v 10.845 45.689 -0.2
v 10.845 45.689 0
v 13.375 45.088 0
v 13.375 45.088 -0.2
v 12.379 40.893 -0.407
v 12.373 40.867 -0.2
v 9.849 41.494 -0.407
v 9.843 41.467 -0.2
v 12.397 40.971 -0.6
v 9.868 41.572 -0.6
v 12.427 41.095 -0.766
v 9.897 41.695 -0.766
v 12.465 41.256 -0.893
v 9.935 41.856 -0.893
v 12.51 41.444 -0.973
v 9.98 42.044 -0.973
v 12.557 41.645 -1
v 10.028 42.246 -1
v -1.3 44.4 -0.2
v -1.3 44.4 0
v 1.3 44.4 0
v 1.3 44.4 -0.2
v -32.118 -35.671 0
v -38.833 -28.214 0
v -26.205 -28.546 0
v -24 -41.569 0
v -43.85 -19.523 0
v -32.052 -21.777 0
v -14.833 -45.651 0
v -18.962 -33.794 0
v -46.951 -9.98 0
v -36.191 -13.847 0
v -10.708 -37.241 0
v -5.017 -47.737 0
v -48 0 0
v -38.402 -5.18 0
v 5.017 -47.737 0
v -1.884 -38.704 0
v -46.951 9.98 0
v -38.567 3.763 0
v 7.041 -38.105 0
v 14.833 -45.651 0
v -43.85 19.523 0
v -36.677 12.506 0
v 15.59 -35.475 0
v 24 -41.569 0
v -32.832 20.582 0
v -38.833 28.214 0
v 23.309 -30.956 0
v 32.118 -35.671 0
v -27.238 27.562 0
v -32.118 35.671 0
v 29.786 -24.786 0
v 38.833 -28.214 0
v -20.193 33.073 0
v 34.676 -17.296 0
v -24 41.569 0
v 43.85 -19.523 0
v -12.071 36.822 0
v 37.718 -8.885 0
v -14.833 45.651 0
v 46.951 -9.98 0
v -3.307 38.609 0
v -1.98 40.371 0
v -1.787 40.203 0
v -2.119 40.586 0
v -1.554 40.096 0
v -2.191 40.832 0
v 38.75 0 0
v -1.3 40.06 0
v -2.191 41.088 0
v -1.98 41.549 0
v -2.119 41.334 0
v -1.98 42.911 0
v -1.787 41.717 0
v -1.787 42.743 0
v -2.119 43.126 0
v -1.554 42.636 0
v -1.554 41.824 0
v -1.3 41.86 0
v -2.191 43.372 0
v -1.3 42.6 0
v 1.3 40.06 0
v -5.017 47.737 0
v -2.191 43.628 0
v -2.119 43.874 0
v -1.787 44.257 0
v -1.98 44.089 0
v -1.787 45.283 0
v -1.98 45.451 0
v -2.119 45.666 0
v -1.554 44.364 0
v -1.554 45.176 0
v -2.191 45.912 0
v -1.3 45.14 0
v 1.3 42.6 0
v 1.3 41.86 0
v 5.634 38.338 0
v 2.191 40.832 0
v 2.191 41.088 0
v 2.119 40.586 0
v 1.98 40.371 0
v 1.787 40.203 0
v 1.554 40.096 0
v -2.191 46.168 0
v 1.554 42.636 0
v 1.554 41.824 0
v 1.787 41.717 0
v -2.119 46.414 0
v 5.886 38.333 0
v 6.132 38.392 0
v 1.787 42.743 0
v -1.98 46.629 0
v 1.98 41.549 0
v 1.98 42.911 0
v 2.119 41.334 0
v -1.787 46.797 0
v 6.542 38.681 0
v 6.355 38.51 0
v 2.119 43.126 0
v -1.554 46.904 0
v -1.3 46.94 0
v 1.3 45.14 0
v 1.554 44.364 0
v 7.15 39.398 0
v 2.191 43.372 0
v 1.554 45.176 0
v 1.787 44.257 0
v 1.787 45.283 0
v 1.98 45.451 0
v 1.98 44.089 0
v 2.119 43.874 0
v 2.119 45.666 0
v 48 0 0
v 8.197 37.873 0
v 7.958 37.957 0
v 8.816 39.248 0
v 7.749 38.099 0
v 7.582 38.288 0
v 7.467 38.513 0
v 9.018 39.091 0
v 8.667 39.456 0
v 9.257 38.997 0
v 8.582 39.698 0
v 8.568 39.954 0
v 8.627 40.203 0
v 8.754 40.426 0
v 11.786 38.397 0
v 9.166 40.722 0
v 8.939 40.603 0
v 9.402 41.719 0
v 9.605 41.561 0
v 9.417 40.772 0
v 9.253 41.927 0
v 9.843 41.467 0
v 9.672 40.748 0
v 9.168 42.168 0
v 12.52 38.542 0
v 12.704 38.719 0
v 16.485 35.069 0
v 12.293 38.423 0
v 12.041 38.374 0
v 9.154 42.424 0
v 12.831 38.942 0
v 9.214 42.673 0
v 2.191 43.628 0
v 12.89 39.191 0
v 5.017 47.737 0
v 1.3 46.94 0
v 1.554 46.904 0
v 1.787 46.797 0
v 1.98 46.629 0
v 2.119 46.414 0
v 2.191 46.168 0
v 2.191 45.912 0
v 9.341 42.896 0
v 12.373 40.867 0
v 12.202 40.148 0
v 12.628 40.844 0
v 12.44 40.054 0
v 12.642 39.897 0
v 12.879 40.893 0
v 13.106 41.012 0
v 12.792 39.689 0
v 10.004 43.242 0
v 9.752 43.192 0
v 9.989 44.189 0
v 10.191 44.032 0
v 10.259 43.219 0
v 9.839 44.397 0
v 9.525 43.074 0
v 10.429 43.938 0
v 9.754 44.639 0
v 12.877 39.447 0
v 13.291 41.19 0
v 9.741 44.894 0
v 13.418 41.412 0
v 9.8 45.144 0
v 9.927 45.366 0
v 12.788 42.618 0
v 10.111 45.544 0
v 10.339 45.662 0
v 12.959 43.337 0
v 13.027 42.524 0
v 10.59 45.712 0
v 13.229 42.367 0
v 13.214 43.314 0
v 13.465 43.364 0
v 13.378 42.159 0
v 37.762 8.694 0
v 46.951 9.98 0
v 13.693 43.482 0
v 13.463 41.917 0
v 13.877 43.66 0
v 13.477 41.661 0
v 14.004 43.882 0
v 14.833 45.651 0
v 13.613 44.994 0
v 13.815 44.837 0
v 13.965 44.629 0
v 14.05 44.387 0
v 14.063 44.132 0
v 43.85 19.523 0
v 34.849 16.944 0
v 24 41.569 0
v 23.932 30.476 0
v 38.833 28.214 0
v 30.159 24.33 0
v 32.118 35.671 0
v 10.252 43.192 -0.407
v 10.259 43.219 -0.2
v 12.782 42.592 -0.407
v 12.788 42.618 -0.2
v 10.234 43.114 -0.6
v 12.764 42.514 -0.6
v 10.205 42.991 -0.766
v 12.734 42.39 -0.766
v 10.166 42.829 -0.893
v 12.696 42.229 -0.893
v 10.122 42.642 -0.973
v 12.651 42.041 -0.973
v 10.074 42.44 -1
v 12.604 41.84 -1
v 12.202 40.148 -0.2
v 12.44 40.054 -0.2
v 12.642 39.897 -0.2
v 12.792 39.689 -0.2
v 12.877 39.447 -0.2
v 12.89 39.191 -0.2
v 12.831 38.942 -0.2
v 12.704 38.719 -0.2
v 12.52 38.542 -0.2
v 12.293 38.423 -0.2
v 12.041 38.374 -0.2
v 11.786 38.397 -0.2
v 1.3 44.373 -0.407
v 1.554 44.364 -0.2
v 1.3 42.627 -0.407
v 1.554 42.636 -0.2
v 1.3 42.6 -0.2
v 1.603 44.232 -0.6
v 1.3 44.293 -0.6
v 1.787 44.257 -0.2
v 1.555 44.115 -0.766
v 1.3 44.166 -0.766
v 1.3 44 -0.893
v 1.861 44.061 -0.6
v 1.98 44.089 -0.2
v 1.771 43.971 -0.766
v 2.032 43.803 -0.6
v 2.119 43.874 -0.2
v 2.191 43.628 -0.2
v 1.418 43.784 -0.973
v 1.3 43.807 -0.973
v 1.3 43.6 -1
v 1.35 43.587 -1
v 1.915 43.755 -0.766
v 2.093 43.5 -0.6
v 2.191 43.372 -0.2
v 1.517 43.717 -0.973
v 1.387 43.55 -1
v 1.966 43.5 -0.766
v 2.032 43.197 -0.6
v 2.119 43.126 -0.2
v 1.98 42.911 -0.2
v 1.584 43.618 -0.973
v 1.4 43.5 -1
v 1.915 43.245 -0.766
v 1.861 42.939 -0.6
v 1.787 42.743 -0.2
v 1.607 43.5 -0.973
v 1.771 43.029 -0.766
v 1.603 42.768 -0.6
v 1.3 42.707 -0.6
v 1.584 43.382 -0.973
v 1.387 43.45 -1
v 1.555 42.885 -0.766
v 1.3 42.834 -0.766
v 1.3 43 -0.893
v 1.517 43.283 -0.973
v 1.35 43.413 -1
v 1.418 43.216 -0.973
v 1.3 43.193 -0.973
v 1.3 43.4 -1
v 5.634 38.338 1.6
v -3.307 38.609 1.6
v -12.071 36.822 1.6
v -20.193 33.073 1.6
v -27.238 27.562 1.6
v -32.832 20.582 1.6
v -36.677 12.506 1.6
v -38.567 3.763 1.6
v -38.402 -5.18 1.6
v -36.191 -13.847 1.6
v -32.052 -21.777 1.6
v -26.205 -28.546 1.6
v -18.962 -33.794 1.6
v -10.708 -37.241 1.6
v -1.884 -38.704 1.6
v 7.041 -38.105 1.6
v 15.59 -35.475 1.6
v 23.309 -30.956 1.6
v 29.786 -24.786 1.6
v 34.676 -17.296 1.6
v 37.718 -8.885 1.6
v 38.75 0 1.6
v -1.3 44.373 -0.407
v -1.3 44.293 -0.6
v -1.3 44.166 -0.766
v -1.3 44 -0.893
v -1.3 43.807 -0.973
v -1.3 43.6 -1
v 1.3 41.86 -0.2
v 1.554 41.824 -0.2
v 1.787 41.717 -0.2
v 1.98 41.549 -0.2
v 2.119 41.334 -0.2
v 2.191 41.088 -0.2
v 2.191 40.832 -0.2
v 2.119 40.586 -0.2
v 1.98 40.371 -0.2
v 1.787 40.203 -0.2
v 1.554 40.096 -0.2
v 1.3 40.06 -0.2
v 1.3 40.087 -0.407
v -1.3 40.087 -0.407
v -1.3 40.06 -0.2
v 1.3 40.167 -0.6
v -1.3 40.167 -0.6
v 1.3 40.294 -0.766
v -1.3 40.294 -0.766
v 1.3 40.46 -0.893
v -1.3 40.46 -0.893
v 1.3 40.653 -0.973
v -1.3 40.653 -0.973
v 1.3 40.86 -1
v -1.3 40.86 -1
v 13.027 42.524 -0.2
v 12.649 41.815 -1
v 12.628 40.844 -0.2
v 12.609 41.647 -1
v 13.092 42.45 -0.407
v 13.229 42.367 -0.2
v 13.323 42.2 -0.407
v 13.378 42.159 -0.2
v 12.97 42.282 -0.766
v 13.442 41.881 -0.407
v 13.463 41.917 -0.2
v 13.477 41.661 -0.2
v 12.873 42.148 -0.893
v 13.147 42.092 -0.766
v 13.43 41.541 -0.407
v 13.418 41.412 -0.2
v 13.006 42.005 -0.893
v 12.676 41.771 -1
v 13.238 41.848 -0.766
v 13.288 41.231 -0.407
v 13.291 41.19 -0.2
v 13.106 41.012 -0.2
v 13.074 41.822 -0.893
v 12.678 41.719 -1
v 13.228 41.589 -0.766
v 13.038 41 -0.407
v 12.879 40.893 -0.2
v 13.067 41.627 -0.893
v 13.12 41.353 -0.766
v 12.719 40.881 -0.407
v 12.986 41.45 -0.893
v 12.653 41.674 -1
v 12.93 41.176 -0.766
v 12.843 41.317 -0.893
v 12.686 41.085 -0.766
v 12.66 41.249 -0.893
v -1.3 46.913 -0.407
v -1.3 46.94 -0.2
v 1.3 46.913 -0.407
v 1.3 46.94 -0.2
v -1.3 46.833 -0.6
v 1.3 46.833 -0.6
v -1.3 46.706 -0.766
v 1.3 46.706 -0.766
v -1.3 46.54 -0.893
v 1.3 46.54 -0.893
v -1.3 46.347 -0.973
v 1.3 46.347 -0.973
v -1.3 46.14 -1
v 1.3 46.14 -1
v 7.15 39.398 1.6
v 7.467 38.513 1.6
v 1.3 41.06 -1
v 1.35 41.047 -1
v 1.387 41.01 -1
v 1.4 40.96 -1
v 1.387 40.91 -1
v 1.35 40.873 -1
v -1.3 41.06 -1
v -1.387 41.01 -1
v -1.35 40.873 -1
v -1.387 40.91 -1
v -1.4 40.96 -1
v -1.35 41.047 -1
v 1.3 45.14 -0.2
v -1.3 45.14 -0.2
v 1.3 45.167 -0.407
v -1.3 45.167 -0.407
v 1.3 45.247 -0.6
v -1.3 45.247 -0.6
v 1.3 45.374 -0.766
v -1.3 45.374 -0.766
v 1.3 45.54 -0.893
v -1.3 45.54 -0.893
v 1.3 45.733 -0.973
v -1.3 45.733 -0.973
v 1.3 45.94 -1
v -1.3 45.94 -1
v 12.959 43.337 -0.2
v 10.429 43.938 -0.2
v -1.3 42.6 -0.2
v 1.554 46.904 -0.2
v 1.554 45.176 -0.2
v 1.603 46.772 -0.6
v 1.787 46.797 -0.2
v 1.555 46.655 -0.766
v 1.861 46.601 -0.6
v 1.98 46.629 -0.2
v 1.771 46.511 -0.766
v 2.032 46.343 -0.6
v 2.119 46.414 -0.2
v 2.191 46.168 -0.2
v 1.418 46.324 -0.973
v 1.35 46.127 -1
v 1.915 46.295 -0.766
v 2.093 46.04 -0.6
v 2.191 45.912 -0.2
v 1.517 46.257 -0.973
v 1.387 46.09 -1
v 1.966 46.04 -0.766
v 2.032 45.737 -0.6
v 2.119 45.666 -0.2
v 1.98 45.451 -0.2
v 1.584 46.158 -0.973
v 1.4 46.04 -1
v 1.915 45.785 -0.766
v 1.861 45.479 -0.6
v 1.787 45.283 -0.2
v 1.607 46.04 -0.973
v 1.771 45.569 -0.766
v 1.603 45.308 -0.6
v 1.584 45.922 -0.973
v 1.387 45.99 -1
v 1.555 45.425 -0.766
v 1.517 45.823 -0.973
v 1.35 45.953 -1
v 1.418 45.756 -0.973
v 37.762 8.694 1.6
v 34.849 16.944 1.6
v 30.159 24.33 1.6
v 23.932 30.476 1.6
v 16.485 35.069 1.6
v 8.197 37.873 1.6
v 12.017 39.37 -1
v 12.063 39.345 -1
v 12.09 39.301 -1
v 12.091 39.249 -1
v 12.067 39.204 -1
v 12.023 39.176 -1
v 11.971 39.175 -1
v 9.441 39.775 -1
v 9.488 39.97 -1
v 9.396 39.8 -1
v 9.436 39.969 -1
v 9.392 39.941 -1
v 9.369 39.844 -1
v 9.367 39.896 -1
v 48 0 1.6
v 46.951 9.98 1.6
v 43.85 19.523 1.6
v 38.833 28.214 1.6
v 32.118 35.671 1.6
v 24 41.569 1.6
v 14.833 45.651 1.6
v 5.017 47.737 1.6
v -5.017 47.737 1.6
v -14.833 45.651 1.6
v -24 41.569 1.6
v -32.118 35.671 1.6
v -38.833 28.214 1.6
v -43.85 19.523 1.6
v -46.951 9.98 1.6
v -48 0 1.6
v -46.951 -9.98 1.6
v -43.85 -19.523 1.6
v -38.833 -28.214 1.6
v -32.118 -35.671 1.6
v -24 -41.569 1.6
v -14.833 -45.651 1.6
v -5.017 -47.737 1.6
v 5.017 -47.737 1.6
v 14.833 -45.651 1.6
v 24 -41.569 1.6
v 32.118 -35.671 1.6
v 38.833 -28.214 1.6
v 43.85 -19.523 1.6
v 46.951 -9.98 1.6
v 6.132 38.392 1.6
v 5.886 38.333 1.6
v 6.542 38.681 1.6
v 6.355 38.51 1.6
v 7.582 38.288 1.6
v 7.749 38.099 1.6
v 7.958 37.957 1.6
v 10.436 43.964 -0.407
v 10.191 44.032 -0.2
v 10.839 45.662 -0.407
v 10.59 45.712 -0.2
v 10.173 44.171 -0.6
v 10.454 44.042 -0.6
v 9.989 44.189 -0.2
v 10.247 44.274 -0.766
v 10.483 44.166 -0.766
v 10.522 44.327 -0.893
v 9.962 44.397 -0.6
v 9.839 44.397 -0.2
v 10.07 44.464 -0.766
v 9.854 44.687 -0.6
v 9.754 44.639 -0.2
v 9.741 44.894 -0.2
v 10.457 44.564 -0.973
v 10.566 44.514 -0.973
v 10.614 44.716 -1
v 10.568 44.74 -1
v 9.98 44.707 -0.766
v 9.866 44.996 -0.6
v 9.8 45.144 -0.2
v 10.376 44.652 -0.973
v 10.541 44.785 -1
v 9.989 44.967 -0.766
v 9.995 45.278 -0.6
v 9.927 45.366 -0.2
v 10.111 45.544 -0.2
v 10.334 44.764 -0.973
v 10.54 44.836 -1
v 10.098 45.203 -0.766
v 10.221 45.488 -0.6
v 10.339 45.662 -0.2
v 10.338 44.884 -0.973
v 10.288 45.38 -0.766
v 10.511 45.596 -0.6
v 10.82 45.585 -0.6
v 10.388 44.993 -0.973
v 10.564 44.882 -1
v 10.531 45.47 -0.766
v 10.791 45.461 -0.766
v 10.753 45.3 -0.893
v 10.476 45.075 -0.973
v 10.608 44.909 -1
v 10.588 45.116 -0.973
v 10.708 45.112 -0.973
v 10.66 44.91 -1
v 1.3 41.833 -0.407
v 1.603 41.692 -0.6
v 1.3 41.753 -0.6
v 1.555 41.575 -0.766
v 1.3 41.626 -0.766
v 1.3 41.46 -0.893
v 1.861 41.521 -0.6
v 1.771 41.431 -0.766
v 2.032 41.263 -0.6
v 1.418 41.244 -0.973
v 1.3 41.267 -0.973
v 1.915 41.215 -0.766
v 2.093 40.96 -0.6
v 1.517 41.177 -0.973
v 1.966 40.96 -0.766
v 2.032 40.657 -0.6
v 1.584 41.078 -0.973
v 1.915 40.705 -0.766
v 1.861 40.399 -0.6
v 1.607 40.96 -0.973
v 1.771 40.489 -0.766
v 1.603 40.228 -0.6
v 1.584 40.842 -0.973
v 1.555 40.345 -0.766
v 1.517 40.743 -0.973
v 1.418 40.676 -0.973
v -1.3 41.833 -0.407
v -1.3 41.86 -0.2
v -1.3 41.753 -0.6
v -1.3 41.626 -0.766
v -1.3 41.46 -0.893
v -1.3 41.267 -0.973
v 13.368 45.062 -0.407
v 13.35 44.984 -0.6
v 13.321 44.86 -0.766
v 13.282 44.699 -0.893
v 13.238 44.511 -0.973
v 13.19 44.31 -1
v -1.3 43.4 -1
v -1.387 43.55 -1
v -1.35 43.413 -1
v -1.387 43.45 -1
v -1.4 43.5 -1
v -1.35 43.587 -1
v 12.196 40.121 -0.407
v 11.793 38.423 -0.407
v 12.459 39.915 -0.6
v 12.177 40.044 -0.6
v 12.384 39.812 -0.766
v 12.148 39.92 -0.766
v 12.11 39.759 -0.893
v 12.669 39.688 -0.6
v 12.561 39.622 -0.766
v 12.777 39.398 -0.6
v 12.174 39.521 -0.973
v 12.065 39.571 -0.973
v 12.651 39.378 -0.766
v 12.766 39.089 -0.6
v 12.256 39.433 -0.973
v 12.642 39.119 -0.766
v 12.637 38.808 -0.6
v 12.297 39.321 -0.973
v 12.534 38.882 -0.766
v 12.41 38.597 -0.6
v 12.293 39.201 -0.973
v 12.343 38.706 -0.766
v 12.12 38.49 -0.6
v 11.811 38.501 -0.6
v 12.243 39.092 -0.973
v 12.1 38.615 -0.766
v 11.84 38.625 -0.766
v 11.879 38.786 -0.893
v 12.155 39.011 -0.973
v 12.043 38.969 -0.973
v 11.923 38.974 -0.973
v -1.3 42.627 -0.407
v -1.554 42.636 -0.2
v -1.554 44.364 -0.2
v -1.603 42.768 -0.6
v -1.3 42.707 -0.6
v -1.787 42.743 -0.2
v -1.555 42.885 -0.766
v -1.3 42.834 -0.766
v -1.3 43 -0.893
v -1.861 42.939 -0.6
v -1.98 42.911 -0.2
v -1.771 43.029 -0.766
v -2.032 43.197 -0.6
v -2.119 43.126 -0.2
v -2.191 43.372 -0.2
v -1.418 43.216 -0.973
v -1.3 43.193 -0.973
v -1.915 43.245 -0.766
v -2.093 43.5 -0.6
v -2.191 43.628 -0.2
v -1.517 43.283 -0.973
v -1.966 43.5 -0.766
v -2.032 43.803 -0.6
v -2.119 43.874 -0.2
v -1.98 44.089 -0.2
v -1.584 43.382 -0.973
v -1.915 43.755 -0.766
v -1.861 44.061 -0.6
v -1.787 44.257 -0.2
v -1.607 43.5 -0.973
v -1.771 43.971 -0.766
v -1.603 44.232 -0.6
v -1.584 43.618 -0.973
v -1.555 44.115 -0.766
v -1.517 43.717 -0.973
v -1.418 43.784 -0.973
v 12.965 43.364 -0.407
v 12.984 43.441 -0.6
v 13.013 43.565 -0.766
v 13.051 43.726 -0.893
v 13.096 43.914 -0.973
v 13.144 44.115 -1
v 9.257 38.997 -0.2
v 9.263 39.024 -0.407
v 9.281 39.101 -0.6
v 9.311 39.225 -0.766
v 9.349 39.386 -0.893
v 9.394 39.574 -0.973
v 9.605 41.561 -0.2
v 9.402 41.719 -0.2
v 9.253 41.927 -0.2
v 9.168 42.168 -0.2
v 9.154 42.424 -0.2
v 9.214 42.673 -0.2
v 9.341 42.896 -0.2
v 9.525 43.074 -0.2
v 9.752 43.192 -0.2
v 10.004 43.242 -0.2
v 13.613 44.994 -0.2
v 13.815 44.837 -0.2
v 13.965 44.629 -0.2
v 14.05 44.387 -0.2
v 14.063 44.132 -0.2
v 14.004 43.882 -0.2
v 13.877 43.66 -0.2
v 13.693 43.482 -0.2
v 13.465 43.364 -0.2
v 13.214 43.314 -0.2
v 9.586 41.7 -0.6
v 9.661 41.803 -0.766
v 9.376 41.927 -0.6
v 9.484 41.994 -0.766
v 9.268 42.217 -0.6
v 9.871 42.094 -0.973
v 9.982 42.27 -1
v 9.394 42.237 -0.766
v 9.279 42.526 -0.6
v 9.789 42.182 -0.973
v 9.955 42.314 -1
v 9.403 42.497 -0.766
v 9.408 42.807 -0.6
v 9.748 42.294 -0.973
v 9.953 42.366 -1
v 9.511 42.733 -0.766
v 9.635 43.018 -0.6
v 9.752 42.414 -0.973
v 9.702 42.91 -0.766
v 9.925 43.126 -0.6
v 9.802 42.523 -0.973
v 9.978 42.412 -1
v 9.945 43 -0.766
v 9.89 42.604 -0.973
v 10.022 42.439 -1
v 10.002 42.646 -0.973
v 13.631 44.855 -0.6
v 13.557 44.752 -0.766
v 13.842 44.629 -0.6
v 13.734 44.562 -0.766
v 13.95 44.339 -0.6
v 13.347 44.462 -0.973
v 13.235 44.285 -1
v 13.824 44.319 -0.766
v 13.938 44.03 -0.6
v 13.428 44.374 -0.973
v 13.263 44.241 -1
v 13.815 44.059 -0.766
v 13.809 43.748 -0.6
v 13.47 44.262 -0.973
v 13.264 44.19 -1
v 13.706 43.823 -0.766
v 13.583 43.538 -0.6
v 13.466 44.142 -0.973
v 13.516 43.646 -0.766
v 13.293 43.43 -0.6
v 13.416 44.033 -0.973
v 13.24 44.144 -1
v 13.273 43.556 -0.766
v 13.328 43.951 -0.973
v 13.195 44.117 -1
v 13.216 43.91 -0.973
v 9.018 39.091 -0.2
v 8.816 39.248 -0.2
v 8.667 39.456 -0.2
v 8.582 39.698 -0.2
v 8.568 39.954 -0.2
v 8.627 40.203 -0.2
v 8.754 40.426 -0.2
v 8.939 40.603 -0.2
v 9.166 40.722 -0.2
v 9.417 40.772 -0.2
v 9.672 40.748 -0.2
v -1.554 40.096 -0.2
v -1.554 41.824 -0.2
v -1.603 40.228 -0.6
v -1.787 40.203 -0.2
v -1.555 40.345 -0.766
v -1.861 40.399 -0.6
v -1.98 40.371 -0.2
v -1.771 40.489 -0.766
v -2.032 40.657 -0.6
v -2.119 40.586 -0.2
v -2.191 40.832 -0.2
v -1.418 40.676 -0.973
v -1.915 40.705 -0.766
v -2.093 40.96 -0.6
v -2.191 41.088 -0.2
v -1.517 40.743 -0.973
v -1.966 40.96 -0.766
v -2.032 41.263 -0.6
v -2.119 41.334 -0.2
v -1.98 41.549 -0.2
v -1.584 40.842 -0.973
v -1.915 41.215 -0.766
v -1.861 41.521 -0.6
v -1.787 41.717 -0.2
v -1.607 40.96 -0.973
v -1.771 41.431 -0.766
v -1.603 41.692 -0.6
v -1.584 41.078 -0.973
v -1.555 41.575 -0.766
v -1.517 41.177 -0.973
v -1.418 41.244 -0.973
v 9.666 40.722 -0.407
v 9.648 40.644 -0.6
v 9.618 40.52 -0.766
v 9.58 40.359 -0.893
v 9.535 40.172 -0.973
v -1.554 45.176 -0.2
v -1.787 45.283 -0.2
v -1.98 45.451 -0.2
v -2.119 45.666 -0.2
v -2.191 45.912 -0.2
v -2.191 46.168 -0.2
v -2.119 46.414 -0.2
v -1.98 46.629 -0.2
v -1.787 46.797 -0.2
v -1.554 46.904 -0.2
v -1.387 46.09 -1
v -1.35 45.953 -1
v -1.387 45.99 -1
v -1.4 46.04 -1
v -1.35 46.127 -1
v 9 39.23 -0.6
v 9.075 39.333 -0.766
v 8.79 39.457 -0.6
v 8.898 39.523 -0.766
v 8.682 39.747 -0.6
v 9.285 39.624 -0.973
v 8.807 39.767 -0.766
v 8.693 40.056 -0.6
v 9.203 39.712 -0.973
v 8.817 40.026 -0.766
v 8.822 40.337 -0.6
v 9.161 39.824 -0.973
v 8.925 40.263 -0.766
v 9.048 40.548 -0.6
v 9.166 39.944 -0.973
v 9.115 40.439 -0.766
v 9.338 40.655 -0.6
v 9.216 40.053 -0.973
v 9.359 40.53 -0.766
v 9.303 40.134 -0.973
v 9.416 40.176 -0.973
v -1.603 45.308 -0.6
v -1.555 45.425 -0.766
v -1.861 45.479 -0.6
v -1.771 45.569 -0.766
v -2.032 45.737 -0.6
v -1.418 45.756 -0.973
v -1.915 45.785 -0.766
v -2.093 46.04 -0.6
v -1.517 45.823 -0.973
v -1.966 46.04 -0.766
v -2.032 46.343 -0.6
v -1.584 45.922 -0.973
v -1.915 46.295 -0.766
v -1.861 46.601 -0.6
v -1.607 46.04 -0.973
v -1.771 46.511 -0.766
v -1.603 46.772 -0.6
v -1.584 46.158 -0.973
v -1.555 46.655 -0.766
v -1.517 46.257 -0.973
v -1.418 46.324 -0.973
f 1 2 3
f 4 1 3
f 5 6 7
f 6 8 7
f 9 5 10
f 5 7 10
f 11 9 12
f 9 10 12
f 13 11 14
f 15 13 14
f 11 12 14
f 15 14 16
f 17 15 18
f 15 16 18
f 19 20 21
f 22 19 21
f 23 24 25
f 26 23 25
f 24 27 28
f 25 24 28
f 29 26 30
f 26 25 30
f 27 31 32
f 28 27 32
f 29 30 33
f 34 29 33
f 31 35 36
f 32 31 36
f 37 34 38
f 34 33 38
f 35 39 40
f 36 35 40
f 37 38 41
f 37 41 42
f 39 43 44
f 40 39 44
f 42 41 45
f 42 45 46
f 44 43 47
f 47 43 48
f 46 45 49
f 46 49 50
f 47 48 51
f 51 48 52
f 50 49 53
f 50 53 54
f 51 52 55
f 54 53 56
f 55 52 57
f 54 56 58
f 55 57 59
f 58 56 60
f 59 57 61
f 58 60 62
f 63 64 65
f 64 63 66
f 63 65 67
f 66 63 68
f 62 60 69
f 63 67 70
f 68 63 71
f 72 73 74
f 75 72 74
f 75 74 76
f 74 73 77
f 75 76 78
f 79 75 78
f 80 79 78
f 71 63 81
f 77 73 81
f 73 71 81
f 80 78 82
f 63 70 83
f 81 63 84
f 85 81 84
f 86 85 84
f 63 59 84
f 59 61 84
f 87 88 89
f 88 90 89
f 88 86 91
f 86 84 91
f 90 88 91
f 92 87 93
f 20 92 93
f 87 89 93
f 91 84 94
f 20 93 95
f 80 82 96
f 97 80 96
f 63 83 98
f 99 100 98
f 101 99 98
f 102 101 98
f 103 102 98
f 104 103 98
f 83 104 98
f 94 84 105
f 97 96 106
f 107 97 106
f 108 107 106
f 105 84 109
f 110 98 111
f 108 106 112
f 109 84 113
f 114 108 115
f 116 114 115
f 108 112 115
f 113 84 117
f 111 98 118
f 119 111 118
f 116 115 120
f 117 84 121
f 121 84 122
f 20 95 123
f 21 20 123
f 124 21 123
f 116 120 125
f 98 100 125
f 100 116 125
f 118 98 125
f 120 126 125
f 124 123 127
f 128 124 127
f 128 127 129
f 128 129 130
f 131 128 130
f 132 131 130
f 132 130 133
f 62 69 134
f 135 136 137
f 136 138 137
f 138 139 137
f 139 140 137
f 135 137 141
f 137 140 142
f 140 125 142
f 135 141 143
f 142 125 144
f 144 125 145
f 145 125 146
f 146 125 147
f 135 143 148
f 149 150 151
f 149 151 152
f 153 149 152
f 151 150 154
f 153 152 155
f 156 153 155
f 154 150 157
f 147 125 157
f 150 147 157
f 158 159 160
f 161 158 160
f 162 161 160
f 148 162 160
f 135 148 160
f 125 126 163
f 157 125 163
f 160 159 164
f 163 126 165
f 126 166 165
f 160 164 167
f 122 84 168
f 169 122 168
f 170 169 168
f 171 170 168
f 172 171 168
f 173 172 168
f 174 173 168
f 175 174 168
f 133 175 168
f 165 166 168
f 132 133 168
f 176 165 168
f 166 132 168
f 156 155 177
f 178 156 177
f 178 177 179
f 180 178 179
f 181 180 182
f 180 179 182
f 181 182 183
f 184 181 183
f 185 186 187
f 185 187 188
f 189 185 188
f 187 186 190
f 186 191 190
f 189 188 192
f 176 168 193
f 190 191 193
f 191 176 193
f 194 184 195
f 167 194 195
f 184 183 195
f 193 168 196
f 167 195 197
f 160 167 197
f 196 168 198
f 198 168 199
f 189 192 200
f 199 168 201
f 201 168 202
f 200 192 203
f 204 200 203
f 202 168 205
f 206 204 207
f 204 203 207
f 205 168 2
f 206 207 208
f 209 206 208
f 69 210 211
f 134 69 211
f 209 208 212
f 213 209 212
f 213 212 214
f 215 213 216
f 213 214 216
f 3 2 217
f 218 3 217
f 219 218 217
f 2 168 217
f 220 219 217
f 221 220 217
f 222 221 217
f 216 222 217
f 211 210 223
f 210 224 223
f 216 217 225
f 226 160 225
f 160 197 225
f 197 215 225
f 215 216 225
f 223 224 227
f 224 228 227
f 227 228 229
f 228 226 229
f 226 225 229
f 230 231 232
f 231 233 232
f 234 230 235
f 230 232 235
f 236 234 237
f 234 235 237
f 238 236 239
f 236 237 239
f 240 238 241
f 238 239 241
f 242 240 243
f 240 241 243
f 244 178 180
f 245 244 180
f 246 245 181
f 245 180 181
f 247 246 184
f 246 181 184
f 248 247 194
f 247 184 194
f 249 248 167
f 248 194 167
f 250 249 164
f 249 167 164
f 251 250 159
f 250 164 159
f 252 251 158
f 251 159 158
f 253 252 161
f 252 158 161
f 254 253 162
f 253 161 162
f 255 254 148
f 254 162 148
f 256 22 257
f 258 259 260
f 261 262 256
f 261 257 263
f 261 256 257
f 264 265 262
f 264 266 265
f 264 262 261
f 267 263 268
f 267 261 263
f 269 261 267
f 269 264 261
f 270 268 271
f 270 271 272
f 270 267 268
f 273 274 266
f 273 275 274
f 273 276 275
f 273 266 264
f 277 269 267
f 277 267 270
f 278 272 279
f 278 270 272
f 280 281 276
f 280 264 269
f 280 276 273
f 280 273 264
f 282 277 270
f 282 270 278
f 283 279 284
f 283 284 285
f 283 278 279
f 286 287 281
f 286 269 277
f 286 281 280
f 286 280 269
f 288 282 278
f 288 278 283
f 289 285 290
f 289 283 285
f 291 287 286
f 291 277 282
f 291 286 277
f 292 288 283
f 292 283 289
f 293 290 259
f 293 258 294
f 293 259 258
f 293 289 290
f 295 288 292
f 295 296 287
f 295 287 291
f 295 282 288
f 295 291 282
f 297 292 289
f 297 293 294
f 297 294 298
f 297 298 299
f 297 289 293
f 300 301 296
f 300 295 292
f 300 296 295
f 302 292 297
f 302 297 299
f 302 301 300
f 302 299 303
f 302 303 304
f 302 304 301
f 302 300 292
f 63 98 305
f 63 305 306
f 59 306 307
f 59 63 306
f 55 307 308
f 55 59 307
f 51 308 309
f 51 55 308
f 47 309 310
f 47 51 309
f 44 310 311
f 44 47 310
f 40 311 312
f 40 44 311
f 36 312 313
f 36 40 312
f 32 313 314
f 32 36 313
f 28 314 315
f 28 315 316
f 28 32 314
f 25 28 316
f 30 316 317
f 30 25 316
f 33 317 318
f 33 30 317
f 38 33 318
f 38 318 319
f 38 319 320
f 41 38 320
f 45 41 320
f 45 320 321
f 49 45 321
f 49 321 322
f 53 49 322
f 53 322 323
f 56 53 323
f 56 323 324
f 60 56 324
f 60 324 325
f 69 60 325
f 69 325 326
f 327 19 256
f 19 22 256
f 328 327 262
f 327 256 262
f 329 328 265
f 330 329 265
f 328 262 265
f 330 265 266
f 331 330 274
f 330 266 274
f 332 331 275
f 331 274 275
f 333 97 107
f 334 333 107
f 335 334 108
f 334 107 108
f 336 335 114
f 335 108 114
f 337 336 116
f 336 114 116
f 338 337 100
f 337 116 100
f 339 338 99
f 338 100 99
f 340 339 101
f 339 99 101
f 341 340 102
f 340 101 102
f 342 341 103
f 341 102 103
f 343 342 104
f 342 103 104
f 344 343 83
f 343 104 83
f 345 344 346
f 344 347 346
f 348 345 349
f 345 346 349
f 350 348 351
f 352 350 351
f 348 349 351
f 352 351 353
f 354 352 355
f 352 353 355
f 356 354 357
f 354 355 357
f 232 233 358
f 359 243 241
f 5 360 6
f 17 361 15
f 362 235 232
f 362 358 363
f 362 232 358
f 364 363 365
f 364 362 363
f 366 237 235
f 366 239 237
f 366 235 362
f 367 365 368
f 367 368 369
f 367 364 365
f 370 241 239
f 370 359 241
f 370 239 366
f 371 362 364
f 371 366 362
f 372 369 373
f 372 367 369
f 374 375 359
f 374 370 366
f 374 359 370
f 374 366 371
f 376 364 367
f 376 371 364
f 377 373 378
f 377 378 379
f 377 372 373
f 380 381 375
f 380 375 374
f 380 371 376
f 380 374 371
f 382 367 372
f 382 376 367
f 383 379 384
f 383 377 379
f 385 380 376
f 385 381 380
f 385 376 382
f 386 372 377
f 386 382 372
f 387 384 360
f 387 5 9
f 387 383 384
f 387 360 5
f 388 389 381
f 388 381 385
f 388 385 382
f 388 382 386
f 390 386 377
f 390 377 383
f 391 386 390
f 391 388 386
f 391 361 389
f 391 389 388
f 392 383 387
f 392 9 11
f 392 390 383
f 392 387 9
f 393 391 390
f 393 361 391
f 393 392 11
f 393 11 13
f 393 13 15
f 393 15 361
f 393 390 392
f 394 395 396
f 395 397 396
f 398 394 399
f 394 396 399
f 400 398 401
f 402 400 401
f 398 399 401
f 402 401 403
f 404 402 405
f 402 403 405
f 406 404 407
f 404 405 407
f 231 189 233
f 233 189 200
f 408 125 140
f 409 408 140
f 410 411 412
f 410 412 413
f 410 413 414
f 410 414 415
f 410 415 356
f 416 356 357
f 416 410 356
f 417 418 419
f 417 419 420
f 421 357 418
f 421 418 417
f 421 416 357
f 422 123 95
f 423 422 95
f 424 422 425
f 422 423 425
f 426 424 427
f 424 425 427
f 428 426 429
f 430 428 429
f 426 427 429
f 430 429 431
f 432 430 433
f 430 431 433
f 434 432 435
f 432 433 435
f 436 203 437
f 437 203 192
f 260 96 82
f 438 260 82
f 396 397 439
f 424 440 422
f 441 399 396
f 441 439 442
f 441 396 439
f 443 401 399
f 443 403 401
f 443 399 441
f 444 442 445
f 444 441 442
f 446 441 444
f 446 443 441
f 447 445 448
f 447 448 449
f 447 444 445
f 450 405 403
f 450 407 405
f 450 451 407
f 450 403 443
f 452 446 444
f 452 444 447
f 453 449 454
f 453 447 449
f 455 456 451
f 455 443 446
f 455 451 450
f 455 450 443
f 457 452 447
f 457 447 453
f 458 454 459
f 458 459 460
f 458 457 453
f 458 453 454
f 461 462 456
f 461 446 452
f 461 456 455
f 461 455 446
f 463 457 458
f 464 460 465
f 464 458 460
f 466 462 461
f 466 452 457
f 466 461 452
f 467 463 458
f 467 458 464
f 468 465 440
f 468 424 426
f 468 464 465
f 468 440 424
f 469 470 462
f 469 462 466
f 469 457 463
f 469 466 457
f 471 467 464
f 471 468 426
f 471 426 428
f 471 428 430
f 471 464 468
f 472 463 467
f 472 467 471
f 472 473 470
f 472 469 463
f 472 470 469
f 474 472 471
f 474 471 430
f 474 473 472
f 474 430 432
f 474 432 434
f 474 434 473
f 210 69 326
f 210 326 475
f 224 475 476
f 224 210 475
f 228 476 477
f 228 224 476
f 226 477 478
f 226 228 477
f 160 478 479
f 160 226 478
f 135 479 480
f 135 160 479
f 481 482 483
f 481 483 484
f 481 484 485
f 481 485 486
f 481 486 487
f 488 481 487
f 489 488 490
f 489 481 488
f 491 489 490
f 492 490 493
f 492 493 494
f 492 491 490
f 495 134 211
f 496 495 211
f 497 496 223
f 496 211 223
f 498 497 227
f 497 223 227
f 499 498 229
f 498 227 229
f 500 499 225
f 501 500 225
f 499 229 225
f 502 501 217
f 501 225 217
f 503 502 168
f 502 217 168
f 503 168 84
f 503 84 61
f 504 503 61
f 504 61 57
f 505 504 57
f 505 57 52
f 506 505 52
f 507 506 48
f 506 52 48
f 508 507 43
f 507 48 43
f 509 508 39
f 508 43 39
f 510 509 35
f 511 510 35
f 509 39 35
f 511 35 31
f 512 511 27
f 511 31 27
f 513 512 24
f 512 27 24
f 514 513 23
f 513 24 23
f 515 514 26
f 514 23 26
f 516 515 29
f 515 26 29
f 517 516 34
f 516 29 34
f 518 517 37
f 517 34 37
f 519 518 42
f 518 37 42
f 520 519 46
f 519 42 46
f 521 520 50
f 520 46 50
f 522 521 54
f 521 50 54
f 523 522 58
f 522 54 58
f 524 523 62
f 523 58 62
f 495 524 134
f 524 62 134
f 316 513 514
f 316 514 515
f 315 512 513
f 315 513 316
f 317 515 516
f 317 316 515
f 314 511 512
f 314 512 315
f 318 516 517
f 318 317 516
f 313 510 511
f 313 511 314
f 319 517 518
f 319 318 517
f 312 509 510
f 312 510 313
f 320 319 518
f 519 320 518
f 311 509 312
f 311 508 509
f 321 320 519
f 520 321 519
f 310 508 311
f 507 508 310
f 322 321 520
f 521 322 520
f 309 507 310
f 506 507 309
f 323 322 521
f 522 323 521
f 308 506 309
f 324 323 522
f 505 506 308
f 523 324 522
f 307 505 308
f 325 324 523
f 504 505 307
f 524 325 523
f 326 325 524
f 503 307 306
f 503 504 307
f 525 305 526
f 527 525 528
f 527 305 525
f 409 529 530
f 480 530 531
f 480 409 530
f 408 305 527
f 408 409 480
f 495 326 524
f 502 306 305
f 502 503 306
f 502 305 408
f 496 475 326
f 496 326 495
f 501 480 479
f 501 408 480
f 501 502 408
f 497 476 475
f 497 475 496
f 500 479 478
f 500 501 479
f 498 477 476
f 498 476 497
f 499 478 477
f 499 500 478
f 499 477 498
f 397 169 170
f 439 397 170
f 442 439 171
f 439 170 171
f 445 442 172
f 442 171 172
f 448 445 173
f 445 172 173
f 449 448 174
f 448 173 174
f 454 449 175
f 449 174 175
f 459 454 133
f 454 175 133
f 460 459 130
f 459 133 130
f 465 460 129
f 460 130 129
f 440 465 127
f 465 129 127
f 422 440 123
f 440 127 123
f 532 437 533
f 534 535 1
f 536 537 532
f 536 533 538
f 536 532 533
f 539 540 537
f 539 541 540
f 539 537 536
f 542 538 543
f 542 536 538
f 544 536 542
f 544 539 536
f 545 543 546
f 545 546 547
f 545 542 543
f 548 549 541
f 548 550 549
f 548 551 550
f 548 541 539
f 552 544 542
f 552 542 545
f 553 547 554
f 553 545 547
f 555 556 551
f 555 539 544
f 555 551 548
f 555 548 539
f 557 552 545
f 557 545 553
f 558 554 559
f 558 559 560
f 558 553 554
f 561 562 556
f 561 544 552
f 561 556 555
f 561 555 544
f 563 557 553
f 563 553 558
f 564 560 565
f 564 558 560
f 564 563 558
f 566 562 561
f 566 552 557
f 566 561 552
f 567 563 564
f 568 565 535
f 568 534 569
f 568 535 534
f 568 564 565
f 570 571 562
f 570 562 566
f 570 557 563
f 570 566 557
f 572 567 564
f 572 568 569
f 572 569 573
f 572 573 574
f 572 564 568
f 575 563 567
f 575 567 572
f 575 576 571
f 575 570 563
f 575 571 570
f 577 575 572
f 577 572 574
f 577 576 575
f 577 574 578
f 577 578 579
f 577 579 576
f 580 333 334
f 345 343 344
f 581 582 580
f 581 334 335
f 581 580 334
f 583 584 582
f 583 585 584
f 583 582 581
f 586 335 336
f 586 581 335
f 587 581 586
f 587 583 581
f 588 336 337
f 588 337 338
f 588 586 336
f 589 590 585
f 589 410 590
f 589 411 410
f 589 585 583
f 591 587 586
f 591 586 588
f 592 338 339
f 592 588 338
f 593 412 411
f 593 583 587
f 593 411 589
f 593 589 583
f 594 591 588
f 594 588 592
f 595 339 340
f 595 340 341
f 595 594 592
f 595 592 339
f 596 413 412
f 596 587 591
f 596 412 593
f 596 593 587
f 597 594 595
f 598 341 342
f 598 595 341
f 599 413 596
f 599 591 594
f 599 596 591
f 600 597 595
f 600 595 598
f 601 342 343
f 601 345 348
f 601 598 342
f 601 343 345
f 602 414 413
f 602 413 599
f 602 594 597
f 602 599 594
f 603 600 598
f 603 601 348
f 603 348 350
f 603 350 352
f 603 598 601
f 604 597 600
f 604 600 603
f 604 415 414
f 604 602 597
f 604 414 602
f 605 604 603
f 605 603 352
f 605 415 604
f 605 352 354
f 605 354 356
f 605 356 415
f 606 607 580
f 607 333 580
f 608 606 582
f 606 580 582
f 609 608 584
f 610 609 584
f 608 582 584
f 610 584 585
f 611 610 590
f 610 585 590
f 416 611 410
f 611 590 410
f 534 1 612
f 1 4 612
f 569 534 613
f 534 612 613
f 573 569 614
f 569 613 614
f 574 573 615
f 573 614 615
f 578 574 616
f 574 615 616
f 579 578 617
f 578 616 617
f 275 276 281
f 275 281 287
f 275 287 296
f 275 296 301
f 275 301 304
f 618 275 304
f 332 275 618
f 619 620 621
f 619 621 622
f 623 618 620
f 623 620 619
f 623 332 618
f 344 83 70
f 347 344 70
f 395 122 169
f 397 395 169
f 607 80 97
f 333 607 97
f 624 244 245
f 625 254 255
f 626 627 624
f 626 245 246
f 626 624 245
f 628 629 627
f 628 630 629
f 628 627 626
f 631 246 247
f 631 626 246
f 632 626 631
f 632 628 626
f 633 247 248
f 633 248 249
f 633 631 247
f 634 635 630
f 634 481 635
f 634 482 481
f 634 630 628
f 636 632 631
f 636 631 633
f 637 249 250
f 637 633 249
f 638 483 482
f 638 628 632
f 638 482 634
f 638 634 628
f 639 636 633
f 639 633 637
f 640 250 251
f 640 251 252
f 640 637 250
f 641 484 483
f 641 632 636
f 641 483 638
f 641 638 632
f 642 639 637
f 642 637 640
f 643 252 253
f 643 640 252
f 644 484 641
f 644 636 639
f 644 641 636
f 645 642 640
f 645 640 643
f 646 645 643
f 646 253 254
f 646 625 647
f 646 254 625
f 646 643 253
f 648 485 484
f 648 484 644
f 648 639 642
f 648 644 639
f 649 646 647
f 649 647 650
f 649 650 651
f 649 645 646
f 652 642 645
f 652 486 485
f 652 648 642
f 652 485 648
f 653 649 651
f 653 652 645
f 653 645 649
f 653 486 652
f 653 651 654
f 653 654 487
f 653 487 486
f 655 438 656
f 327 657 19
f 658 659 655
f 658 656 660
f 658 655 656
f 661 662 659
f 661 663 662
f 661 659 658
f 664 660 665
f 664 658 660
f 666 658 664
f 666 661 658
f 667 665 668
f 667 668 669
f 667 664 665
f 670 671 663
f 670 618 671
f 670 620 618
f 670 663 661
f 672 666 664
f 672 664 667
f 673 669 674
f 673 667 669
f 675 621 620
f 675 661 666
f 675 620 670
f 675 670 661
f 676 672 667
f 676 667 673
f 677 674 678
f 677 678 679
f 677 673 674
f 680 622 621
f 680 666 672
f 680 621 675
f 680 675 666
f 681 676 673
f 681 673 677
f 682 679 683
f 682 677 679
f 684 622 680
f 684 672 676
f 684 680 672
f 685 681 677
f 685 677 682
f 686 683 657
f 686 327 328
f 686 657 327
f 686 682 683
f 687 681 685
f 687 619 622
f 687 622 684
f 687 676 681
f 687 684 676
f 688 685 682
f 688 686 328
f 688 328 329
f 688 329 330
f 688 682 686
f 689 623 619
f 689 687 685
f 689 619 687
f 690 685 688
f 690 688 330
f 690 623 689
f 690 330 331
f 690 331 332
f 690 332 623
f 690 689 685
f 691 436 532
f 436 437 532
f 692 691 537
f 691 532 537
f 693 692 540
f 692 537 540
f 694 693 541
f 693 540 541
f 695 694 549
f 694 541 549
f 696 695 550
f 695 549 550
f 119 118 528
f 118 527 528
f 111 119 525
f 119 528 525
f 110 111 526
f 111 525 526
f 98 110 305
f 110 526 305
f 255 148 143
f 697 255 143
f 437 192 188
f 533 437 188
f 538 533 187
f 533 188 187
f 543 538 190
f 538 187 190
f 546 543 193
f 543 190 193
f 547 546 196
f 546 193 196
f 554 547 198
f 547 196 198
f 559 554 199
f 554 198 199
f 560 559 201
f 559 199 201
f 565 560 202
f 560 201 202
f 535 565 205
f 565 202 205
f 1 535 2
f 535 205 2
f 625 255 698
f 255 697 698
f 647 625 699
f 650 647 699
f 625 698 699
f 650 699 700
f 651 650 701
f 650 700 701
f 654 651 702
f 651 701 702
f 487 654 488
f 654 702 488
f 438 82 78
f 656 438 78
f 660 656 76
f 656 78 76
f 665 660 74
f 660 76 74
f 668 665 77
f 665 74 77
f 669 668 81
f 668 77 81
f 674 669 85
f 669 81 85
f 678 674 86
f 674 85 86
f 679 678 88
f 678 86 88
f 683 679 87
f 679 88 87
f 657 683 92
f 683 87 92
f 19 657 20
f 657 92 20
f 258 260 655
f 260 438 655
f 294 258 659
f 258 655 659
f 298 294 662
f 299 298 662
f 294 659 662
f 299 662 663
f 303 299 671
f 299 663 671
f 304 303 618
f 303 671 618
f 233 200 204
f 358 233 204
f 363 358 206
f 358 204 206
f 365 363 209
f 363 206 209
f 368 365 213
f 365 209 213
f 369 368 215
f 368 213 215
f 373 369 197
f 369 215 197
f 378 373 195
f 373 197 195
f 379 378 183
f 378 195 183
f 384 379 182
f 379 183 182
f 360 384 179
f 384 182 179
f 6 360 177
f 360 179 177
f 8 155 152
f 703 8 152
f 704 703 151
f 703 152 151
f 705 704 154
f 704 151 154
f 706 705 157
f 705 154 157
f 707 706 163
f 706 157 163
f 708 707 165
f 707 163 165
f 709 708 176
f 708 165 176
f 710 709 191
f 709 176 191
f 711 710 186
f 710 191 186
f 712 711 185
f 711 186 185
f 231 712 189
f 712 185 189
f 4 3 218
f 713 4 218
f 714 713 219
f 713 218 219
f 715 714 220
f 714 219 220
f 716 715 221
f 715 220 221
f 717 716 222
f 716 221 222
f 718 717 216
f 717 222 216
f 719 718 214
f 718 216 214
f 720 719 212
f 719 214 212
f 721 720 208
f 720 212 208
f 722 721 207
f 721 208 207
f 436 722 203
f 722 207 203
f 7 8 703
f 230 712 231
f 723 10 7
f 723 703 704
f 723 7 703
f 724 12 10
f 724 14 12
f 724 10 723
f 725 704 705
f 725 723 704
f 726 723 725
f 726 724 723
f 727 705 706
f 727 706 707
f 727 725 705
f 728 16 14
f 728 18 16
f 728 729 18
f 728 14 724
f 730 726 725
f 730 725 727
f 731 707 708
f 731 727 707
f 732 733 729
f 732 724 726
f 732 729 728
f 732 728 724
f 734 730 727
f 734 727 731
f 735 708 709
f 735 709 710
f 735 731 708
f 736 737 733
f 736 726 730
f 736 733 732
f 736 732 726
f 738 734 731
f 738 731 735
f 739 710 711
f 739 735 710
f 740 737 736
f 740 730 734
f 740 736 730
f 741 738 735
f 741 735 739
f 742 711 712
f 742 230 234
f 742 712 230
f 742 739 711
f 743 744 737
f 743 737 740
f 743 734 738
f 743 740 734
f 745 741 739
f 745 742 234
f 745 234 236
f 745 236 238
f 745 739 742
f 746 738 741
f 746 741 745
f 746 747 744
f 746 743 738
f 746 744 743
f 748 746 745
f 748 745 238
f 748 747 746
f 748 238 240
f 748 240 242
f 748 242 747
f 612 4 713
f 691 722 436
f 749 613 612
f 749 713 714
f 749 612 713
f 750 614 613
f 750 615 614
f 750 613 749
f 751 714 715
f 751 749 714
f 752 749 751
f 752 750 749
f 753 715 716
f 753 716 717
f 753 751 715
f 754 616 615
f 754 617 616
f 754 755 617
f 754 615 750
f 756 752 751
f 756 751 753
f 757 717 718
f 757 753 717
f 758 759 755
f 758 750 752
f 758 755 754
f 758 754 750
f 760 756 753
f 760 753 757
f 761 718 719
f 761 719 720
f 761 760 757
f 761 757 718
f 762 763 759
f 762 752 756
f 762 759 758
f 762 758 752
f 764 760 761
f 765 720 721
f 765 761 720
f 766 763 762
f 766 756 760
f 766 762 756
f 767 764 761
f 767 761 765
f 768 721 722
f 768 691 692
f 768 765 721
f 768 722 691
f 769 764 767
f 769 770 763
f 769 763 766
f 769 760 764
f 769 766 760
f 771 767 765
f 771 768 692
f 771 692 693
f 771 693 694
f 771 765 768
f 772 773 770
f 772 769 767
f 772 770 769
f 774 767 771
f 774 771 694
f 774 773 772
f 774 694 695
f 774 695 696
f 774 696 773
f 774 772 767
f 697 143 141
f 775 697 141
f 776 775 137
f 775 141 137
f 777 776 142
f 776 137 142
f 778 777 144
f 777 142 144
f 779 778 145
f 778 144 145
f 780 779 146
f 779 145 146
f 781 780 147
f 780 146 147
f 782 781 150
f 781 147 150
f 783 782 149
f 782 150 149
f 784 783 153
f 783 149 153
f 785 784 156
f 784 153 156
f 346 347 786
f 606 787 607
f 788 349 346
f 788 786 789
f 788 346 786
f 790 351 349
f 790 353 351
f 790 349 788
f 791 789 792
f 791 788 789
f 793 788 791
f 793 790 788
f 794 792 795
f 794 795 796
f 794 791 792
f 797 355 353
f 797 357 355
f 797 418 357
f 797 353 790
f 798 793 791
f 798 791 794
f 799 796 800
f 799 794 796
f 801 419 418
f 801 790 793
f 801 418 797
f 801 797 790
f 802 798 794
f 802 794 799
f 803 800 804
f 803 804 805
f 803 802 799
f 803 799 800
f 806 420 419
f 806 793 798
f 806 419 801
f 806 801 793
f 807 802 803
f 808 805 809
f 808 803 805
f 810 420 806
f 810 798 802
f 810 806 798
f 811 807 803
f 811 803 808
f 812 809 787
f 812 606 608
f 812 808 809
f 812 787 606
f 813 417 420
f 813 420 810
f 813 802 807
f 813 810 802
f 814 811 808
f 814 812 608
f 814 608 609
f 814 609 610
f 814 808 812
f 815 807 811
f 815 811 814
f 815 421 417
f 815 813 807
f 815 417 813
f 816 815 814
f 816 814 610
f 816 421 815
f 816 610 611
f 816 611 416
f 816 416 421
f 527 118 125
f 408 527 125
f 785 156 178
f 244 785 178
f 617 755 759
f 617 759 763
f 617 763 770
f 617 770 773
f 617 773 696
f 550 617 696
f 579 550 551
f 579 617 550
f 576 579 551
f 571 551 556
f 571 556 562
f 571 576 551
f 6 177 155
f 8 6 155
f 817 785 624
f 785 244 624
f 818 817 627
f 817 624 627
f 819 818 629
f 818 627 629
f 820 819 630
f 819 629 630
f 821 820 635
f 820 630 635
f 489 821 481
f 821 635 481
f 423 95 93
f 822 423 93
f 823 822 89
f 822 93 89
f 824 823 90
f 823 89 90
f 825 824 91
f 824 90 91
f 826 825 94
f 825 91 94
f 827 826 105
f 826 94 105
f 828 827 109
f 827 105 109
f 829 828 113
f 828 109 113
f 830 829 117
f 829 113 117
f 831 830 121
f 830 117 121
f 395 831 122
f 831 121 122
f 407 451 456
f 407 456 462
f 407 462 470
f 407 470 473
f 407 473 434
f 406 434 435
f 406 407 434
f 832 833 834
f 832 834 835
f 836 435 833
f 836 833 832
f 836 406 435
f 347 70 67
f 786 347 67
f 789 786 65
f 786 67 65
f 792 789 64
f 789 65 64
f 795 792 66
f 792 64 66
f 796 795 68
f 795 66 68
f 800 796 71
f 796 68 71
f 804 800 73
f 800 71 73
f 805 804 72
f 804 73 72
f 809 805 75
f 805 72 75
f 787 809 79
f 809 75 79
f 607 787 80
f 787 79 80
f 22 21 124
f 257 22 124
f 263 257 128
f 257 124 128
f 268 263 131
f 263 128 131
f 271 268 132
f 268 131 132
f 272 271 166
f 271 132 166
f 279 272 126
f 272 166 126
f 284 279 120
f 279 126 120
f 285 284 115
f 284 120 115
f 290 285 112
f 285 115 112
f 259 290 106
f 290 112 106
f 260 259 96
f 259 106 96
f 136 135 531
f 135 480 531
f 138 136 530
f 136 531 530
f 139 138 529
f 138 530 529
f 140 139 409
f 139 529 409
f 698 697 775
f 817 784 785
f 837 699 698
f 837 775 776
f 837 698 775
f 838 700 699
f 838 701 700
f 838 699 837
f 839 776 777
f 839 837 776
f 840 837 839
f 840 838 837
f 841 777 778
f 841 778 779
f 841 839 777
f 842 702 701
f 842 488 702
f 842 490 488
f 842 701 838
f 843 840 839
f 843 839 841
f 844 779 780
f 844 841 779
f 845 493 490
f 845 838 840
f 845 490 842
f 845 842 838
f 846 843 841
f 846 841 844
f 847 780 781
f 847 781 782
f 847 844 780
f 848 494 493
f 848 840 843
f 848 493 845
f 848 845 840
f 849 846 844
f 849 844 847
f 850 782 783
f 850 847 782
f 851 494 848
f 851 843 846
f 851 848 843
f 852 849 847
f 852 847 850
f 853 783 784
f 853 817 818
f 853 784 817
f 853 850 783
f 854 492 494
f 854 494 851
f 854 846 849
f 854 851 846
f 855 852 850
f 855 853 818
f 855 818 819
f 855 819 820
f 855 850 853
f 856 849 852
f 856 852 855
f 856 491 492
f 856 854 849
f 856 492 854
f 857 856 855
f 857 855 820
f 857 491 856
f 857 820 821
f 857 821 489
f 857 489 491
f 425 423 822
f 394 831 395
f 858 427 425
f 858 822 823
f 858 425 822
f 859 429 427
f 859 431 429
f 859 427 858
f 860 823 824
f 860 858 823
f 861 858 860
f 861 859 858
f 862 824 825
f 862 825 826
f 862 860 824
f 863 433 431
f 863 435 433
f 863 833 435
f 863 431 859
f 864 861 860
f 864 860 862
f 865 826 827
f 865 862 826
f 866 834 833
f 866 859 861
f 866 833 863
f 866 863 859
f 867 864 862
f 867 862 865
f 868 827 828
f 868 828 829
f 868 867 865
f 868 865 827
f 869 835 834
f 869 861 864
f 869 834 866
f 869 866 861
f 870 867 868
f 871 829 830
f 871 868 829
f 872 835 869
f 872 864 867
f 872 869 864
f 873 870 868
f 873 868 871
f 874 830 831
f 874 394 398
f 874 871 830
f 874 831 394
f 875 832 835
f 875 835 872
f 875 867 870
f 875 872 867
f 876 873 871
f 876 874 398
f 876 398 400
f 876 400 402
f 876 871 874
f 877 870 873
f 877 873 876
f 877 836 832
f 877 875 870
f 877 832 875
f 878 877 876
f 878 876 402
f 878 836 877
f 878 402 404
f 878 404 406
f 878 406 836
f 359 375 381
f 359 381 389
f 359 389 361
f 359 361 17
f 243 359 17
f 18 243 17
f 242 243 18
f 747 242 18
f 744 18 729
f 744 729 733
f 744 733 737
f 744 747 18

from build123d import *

# Parameters (mm, degrees)
SKETCH054_R     = 48
SKETCH054_R_2   = 38.75
PAD029_DEPTH    = 1.6
PAD030_DEPTH    = 1
FILLET018_R     = 0.8
POCKET029_DEPTH = 5
FILLET020_R     = 1


with BuildPart() as part:
    # Sketch054 → Pad029 (new body)
    with BuildSketch(Plane.XY):
        Circle(SKETCH054_R)
        Circle(SKETCH054_R_2, mode=Mode.SUBTRACT)
    extrude(amount=PAD029_DEPTH)

    # Sketch055 → Pad030 (join)
    with BuildSketch(Plane(origin=(0, 0, 0), x_dir=(-1, 0, 0), z_dir=(0, 0, -1))):
        with BuildLine():
            ThreePointArc((-1.3, 46.94), (-2.2, 46.04), (-1.3, 45.14))
            Line((-1.3, 45.14), (1.3, 45.14))
            ThreePointArc((1.3, 45.14), (2.2, 46.04), (1.3, 46.94))
            Line((1.3, 46.94), (-1.3, 46.94))
        make_face()
        with BuildLine():
            ThreePointArc((-1.3, 44.4), (-2.2, 43.5), (-1.3, 42.6))
            Line((-1.3, 42.6), (1.3, 42.6))
            ThreePointArc((1.3, 42.6), (2.2, 43.5), (1.3, 44.4))
            Line((1.3, 44.4), (-1.3, 44.4))
        make_face()
        with BuildLine():
            ThreePointArc((-1.3, 41.86), (-2.2, 40.96), (-1.3, 40.06))
            Line((-1.3, 40.06), (1.3, 40.06))
            ThreePointArc((1.3, 40.06), (2.2, 40.96), (1.3, 41.86))
            Line((1.3, 41.86), (-1.3, 41.86))
        make_face()
        with BuildLine():
            ThreePointArc((-13.374691, 45.088405), (-14.042506, 44.004882), (-12.958983, 43.337066))
            Line((-12.958983, 43.337066), (-10.429272, 43.937534))
            ThreePointArc((-10.429272, 43.937534), (-9.761456, 45.021057), (-10.84498, 45.688872))
            Line((-10.84498, 45.688872), (-13.374691, 45.088405))
        make_face()
        with BuildLine():
            ThreePointArc((-12.788343, 42.618178), (-13.456159, 41.534655), (-12.372635, 40.86684))
            Line((-12.372635, 40.86684), (-9.842924, 41.467307))
            ThreePointArc((-9.842924, 41.467307), (-9.175109, 42.55083), (-10.258632, 43.218646))
            Line((-10.258632, 43.218646), (-12.788343, 42.618178))
        make_face()
        with BuildLine():
            ThreePointArc((-12.201996, 40.147952), (-12.869811, 39.064428), (-11.786288, 38.396613))
            Line((-11.786288, 38.396613), (-9.256577, 38.99708))
            ThreePointArc((-9.256577, 38.99708), (-8.588761, 40.080604), (-9.672285, 40.748419))
            Line((-9.672285, 40.748419), (-12.201996, 40.147952))
        make_face()
    extrude(amount=PAD030_DEPTH)

    # Fillet018
    fillet018_edges = [part.edges().sort_by_distance(p)[0] for p in [
        (9.761456, 45.021057, -1),
        (9.175109, 42.55083, -1),
        (8.588761, 40.080604, -1),
        (-2.2, 40.96, -1),
        (-2.2, 43.5, -1),
        (-2.2, 46.04, -1),
    ]]
    fillet(fillet018_edges, radius=FILLET018_R)

    # Sketch060 → Pocket029 (cut)
    with BuildSketch(Plane.XY):
        with BuildLine():
            ThreePointArc((7.655731, 37.986212), (6.919079, 38.127272), (6.179836, 38.254047))
            Line((6.179836, 38.254047), (7.149736, 39.398292))
            Line((7.149736, 39.398292), (7.655731, 37.986212))
        make_face()
    extrude(amount=POCKET029_DEPTH, mode=Mode.SUBTRACT)

    # Fillet020
    fillet020_edges = [part.edges().sort_by_distance(p)[0] for p in [
        (7.655731, 37.986212, 0.8),
        (6.179836, 38.254047, 0.8),
    ]]
    fillet(fillet020_edges, radius=FILLET020_R)


solid = part.part
